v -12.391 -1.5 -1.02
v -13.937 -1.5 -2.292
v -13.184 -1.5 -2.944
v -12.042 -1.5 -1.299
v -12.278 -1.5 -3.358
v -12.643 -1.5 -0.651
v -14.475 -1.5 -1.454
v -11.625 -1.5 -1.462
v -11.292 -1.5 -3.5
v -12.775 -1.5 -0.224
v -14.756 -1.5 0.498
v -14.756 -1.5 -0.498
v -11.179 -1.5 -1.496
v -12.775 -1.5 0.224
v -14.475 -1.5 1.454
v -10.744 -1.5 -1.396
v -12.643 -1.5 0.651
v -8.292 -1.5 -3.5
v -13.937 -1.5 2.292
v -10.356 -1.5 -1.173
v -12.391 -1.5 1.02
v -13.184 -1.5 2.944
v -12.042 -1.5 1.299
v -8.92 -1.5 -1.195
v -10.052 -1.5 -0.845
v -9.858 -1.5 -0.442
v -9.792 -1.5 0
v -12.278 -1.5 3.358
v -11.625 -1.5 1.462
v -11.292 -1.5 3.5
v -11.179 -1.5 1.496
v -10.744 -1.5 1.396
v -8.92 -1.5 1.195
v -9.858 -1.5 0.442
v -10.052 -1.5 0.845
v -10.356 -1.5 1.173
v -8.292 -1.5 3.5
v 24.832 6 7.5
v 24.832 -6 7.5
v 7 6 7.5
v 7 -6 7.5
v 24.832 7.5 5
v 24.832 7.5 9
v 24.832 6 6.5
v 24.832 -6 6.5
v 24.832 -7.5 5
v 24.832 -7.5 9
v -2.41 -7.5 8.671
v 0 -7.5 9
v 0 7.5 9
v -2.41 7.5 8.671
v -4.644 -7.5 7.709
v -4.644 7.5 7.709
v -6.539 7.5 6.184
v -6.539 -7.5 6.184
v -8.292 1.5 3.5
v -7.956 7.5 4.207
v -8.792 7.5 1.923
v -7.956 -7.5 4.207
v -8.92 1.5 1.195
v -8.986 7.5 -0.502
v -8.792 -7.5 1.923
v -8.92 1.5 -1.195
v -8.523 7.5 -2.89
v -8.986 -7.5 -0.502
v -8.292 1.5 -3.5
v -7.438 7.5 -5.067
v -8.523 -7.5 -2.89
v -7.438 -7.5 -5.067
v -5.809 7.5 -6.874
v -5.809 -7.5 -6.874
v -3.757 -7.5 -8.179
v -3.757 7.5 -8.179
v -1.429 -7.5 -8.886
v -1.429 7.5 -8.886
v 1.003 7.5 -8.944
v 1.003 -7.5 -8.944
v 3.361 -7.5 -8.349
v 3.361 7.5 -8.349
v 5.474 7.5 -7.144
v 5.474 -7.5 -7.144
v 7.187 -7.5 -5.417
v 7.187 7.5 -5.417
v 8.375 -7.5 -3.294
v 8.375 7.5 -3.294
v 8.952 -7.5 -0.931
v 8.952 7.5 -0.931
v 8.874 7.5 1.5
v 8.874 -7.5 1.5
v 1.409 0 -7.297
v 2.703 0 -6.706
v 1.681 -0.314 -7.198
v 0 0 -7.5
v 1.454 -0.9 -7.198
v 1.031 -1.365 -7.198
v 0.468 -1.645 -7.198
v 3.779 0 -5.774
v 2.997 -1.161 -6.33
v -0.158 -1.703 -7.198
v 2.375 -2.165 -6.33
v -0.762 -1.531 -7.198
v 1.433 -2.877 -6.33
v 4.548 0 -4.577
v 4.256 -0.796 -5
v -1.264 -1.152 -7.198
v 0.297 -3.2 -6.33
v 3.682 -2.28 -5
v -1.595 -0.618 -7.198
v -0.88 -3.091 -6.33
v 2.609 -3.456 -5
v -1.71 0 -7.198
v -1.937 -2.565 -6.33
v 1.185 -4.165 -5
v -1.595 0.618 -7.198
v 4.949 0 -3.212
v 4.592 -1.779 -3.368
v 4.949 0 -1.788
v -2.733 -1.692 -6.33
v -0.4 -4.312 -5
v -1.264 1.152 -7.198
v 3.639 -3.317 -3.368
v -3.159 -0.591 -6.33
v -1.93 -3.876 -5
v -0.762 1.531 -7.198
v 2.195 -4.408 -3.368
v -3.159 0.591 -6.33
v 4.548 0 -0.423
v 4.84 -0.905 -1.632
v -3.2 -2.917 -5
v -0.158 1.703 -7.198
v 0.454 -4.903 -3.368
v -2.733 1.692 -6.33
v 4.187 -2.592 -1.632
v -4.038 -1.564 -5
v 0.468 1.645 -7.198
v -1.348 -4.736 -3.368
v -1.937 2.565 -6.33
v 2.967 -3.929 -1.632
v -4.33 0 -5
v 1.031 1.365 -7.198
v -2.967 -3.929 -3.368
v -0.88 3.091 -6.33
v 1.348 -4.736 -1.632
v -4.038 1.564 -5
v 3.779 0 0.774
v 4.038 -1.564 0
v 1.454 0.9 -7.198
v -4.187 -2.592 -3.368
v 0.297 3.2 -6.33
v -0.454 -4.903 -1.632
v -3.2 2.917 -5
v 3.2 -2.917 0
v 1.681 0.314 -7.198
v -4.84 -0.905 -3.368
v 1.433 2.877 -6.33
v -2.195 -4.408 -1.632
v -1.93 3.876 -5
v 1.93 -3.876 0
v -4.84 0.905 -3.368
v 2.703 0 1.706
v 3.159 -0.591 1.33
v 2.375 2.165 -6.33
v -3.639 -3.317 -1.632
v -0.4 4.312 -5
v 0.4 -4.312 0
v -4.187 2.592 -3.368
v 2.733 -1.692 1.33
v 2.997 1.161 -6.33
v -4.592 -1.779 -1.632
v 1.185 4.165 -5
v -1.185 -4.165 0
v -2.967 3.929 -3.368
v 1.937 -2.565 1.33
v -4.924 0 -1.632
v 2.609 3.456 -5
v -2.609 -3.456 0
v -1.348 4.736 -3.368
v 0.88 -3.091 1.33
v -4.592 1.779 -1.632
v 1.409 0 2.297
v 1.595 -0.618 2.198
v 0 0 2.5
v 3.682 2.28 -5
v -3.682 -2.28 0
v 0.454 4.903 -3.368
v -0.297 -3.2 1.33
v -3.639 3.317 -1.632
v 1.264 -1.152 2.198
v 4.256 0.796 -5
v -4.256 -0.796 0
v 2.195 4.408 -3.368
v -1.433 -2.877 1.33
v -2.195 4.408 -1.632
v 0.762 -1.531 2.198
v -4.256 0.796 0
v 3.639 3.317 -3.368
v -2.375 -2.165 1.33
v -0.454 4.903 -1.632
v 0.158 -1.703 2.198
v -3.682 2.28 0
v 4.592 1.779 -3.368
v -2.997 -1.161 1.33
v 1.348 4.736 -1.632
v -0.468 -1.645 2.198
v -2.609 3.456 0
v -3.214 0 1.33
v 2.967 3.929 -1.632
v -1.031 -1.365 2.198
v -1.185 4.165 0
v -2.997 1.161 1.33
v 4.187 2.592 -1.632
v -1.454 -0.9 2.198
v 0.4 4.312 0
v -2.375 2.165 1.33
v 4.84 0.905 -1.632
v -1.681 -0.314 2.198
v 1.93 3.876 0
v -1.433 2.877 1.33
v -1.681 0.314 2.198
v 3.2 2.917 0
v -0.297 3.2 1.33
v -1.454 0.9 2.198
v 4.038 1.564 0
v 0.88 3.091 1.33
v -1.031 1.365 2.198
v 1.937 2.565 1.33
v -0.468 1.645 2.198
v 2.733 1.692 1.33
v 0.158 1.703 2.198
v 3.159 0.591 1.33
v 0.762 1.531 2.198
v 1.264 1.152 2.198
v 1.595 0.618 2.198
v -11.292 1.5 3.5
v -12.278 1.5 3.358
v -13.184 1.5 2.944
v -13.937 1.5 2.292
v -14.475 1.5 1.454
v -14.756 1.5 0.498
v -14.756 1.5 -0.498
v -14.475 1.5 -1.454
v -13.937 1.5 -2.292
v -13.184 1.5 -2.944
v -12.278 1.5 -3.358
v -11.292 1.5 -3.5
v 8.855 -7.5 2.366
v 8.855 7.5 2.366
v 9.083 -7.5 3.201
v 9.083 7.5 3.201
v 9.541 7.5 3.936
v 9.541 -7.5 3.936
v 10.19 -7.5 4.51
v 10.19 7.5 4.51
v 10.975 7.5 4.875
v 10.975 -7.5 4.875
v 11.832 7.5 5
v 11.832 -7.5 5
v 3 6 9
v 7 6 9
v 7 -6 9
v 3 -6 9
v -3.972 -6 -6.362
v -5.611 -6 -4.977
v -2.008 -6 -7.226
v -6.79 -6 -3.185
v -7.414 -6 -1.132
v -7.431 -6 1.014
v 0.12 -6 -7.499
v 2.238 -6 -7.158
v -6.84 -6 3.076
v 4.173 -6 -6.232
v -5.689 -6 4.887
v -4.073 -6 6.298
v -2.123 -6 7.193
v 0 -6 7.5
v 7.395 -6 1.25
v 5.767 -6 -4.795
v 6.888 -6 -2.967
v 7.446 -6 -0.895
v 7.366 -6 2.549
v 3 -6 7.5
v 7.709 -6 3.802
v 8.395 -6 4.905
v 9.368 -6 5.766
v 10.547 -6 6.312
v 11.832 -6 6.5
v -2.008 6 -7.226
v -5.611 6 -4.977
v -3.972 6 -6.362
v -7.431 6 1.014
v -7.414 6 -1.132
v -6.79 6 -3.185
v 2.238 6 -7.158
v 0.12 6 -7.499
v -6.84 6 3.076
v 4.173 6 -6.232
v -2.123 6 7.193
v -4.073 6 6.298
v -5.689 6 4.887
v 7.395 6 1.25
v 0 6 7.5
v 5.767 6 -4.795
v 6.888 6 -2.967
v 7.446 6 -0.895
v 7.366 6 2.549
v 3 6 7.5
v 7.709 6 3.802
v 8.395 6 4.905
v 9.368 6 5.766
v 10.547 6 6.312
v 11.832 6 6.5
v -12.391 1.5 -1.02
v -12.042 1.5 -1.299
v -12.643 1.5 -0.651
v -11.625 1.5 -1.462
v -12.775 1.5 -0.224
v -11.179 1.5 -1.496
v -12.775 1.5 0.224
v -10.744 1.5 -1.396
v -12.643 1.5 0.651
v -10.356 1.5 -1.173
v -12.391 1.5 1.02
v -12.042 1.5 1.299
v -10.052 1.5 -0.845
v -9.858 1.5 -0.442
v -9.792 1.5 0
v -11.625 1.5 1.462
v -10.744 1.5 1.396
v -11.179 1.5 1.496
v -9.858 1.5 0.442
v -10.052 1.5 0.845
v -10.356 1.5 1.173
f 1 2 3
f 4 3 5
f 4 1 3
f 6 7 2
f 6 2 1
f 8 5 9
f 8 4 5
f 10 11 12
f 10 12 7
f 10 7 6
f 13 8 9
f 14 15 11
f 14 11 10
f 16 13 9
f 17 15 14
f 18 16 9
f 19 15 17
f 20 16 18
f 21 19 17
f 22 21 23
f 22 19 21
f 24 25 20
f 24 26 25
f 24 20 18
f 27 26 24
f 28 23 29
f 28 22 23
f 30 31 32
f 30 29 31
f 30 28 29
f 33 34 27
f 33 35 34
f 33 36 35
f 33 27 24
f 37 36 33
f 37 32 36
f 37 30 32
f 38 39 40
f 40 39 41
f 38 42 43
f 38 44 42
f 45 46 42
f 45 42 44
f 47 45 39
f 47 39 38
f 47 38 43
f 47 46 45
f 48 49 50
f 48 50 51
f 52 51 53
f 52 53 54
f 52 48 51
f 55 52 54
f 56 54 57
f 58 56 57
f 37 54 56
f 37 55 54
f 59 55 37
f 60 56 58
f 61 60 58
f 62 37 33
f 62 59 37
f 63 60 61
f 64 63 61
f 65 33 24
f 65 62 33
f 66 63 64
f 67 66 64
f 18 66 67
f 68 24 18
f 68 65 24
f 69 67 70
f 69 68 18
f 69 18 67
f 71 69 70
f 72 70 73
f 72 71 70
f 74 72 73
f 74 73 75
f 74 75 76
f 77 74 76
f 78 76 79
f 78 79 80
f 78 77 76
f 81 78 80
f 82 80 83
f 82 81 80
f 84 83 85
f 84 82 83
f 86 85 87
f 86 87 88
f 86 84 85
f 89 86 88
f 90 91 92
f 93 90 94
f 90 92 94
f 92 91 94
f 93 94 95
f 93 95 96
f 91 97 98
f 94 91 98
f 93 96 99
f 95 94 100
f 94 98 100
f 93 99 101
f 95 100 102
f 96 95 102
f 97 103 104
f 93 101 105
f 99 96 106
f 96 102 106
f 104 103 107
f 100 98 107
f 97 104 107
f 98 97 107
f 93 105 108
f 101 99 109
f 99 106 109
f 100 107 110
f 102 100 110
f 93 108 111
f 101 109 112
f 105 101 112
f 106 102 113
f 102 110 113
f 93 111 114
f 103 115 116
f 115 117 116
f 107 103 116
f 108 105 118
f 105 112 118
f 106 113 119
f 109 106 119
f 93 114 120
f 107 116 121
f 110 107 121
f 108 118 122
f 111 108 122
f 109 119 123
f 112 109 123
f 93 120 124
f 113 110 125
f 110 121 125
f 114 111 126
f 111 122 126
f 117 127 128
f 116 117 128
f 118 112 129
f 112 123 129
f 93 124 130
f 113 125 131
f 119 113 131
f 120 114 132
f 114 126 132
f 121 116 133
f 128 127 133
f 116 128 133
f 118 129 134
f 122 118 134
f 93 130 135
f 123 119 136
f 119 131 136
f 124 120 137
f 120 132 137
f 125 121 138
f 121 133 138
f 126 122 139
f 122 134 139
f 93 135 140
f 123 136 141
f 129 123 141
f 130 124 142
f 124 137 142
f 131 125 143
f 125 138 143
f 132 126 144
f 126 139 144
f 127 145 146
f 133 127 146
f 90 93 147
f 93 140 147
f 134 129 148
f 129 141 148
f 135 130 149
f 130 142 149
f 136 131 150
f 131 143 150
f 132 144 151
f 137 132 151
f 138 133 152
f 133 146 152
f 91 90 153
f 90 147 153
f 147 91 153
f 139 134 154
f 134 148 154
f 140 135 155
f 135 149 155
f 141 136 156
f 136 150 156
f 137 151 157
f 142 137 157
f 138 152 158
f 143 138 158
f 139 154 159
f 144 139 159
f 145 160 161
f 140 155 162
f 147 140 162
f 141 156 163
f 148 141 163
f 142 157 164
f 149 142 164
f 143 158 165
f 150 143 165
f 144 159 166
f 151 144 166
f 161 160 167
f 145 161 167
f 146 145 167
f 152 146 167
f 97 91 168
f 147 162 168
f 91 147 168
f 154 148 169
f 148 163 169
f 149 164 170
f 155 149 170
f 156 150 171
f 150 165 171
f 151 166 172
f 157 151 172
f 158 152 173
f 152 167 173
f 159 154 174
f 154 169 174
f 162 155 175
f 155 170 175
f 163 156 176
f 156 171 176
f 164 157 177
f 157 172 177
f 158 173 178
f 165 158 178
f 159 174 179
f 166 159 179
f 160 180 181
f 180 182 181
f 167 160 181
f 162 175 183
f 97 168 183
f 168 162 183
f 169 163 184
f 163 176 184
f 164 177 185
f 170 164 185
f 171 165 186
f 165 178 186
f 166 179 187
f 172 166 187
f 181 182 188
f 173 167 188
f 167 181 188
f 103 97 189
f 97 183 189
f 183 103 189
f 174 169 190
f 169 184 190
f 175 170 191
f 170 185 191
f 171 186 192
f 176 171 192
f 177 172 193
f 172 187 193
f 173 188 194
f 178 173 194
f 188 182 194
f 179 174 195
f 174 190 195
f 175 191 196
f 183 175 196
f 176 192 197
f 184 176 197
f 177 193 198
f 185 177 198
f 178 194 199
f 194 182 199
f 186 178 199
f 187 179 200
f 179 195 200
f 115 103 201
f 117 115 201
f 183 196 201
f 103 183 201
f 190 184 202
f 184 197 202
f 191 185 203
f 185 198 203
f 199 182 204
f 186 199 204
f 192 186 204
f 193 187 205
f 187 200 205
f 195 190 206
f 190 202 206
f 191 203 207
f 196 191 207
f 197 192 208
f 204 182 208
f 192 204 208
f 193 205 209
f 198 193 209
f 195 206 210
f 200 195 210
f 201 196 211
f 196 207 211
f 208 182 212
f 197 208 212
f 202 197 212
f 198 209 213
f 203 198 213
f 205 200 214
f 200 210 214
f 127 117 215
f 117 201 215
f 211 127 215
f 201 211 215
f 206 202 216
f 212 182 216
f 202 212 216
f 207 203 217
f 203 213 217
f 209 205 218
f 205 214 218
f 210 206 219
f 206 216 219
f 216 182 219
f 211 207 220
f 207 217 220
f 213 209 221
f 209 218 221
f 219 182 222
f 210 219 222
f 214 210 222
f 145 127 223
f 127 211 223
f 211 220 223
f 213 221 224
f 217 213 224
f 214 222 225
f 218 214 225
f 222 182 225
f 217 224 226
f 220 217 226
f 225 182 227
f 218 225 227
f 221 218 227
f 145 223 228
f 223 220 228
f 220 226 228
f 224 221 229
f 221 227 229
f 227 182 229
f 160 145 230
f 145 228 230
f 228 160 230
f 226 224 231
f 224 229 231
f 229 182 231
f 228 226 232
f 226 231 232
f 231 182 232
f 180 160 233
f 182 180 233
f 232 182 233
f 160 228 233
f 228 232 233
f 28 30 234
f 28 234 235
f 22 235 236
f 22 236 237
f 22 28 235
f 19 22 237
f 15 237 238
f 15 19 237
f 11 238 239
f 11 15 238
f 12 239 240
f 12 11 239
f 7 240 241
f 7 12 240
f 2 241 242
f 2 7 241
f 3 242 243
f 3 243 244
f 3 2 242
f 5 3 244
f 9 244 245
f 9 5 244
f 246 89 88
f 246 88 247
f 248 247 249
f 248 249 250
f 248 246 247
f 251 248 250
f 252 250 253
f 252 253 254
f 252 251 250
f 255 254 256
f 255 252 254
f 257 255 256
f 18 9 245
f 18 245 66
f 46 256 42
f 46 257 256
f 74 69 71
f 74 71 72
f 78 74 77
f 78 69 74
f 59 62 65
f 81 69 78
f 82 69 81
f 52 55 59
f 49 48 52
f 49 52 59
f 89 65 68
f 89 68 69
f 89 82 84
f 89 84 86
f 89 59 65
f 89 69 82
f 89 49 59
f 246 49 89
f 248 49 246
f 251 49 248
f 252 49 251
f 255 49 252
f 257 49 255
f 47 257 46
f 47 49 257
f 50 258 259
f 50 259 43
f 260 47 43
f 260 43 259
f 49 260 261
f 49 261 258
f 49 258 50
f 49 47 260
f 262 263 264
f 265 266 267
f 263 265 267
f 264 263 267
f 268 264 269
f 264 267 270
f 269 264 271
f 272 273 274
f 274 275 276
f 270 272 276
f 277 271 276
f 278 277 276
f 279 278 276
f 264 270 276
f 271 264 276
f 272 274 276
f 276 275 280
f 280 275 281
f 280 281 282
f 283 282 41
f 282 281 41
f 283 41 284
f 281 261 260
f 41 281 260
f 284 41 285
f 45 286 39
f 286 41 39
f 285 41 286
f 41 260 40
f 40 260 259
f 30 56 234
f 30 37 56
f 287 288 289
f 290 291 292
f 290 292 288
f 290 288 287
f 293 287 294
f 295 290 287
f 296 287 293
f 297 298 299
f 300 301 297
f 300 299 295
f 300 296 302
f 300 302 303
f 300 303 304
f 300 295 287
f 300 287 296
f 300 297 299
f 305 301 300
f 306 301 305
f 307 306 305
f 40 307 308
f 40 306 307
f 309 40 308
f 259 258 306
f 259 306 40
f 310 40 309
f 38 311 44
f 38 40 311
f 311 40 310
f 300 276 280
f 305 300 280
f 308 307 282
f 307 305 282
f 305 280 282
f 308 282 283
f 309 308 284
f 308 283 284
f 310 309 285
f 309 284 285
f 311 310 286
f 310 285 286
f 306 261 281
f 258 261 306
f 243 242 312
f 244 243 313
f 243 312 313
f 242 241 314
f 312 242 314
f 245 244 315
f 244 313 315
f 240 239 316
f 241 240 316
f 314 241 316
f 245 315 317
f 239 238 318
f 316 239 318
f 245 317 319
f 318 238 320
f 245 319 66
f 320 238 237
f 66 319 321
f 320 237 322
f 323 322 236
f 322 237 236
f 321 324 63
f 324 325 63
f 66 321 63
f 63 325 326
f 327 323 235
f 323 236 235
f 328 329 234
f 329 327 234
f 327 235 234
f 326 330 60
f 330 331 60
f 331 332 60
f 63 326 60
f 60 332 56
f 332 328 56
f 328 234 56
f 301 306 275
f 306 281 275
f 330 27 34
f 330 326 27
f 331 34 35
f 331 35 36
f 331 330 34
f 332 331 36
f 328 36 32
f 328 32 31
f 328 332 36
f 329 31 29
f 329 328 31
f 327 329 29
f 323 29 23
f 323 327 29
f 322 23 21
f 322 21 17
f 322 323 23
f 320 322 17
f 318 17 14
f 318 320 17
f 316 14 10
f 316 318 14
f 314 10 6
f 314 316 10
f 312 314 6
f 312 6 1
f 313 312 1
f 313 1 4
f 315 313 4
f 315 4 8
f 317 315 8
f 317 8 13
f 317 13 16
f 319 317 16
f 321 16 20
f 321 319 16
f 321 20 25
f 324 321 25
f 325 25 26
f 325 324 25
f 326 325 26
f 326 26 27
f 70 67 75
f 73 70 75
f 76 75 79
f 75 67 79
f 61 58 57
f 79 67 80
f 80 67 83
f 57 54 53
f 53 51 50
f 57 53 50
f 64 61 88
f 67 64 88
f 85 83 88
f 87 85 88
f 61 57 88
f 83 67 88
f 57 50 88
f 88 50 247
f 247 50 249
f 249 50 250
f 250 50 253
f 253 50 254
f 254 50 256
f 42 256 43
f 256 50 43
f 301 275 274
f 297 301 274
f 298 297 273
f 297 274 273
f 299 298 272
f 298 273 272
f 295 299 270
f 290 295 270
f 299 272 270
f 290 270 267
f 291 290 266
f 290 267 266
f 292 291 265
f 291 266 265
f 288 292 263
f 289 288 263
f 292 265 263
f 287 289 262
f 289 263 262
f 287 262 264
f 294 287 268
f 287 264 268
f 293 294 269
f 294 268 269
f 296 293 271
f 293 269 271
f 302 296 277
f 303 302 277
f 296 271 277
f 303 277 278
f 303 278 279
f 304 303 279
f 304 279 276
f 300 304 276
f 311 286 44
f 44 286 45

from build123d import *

# Parameters (mm, degrees)
F1_DEPTH = 7.5
F2_T     = -1.5
F3_W     = 4
F3_H     = 12
F4_DEPTH = 1.5
F5_R     = 1.5
F6_DEPTH = 1.5


with BuildPart() as f1:
    # F0 (on Front) → F1 (new body, symmetric)
    with BuildSketch(Plane.XZ):
        with BuildLine():
            Line((24.83216, 9), (0, 9))
            ThreePointArc((0, 9), (-5.809475, -6.873864), (8.87412, 1.5))
            ThreePointArc((8.87412, 1.5), (9.540872, 3.936492), (11.83216, 5))
            Line((11.83216, 5), (24.83216, 5))
            Line((24.83216, 5), (24.83216, 9))
        make_face()
    extrude(amount=F1_DEPTH, both=True)

    # F2
    f2_openings = [f1.faces().sort_by_distance(p)[0] for p in [
        (24.83216, 0, 7),
    ]]
    offset(amount=F2_T, openings=f2_openings)

    # F3 (on face) → F4 (cut)
    with BuildSketch(Plane.XY.offset(9)):
        with Locations((5, 0)):
            Rectangle(F3_W, F3_H)
    extrude(amount=-F4_DEPTH, mode=Mode.SUBTRACT)

    # F5 (on Front) → F6 (join, symmetric)
    with BuildSketch(Plane.XZ):
        with BuildLine():
            Line((-8.291562, 3.5), (-11.291562, 3.5))
            ThreePointArc((-11.291562, 3.5), (-14.791562, 0), (-11.291562, -3.5))
            Line((-11.291562, -3.5), (-8.291562, -3.5))
            Line((-8.291562, -3.5), (-8.291562, 3.5))
        make_face()
        with Locations((-11.291562, 0)):
            Circle(F5_R, mode=Mode.SUBTRACT)
    extrude(amount=F6_DEPTH, both=True)


with BuildPart() as f8:
    # F7 (on Front) → F8 (revolve)
    with BuildSketch(Plane.XZ):
        with BuildLine():
            ThreePointArc((0, -7.5), (5, -2.5), (0, 2.5))
            Line((0, 2.5), (0, -7.5))
        make_face()
    revolve(axis=Axis((0, 0, -2.5), (0, 0, -1)))


solid = Compound([f1.part, f8.part])
